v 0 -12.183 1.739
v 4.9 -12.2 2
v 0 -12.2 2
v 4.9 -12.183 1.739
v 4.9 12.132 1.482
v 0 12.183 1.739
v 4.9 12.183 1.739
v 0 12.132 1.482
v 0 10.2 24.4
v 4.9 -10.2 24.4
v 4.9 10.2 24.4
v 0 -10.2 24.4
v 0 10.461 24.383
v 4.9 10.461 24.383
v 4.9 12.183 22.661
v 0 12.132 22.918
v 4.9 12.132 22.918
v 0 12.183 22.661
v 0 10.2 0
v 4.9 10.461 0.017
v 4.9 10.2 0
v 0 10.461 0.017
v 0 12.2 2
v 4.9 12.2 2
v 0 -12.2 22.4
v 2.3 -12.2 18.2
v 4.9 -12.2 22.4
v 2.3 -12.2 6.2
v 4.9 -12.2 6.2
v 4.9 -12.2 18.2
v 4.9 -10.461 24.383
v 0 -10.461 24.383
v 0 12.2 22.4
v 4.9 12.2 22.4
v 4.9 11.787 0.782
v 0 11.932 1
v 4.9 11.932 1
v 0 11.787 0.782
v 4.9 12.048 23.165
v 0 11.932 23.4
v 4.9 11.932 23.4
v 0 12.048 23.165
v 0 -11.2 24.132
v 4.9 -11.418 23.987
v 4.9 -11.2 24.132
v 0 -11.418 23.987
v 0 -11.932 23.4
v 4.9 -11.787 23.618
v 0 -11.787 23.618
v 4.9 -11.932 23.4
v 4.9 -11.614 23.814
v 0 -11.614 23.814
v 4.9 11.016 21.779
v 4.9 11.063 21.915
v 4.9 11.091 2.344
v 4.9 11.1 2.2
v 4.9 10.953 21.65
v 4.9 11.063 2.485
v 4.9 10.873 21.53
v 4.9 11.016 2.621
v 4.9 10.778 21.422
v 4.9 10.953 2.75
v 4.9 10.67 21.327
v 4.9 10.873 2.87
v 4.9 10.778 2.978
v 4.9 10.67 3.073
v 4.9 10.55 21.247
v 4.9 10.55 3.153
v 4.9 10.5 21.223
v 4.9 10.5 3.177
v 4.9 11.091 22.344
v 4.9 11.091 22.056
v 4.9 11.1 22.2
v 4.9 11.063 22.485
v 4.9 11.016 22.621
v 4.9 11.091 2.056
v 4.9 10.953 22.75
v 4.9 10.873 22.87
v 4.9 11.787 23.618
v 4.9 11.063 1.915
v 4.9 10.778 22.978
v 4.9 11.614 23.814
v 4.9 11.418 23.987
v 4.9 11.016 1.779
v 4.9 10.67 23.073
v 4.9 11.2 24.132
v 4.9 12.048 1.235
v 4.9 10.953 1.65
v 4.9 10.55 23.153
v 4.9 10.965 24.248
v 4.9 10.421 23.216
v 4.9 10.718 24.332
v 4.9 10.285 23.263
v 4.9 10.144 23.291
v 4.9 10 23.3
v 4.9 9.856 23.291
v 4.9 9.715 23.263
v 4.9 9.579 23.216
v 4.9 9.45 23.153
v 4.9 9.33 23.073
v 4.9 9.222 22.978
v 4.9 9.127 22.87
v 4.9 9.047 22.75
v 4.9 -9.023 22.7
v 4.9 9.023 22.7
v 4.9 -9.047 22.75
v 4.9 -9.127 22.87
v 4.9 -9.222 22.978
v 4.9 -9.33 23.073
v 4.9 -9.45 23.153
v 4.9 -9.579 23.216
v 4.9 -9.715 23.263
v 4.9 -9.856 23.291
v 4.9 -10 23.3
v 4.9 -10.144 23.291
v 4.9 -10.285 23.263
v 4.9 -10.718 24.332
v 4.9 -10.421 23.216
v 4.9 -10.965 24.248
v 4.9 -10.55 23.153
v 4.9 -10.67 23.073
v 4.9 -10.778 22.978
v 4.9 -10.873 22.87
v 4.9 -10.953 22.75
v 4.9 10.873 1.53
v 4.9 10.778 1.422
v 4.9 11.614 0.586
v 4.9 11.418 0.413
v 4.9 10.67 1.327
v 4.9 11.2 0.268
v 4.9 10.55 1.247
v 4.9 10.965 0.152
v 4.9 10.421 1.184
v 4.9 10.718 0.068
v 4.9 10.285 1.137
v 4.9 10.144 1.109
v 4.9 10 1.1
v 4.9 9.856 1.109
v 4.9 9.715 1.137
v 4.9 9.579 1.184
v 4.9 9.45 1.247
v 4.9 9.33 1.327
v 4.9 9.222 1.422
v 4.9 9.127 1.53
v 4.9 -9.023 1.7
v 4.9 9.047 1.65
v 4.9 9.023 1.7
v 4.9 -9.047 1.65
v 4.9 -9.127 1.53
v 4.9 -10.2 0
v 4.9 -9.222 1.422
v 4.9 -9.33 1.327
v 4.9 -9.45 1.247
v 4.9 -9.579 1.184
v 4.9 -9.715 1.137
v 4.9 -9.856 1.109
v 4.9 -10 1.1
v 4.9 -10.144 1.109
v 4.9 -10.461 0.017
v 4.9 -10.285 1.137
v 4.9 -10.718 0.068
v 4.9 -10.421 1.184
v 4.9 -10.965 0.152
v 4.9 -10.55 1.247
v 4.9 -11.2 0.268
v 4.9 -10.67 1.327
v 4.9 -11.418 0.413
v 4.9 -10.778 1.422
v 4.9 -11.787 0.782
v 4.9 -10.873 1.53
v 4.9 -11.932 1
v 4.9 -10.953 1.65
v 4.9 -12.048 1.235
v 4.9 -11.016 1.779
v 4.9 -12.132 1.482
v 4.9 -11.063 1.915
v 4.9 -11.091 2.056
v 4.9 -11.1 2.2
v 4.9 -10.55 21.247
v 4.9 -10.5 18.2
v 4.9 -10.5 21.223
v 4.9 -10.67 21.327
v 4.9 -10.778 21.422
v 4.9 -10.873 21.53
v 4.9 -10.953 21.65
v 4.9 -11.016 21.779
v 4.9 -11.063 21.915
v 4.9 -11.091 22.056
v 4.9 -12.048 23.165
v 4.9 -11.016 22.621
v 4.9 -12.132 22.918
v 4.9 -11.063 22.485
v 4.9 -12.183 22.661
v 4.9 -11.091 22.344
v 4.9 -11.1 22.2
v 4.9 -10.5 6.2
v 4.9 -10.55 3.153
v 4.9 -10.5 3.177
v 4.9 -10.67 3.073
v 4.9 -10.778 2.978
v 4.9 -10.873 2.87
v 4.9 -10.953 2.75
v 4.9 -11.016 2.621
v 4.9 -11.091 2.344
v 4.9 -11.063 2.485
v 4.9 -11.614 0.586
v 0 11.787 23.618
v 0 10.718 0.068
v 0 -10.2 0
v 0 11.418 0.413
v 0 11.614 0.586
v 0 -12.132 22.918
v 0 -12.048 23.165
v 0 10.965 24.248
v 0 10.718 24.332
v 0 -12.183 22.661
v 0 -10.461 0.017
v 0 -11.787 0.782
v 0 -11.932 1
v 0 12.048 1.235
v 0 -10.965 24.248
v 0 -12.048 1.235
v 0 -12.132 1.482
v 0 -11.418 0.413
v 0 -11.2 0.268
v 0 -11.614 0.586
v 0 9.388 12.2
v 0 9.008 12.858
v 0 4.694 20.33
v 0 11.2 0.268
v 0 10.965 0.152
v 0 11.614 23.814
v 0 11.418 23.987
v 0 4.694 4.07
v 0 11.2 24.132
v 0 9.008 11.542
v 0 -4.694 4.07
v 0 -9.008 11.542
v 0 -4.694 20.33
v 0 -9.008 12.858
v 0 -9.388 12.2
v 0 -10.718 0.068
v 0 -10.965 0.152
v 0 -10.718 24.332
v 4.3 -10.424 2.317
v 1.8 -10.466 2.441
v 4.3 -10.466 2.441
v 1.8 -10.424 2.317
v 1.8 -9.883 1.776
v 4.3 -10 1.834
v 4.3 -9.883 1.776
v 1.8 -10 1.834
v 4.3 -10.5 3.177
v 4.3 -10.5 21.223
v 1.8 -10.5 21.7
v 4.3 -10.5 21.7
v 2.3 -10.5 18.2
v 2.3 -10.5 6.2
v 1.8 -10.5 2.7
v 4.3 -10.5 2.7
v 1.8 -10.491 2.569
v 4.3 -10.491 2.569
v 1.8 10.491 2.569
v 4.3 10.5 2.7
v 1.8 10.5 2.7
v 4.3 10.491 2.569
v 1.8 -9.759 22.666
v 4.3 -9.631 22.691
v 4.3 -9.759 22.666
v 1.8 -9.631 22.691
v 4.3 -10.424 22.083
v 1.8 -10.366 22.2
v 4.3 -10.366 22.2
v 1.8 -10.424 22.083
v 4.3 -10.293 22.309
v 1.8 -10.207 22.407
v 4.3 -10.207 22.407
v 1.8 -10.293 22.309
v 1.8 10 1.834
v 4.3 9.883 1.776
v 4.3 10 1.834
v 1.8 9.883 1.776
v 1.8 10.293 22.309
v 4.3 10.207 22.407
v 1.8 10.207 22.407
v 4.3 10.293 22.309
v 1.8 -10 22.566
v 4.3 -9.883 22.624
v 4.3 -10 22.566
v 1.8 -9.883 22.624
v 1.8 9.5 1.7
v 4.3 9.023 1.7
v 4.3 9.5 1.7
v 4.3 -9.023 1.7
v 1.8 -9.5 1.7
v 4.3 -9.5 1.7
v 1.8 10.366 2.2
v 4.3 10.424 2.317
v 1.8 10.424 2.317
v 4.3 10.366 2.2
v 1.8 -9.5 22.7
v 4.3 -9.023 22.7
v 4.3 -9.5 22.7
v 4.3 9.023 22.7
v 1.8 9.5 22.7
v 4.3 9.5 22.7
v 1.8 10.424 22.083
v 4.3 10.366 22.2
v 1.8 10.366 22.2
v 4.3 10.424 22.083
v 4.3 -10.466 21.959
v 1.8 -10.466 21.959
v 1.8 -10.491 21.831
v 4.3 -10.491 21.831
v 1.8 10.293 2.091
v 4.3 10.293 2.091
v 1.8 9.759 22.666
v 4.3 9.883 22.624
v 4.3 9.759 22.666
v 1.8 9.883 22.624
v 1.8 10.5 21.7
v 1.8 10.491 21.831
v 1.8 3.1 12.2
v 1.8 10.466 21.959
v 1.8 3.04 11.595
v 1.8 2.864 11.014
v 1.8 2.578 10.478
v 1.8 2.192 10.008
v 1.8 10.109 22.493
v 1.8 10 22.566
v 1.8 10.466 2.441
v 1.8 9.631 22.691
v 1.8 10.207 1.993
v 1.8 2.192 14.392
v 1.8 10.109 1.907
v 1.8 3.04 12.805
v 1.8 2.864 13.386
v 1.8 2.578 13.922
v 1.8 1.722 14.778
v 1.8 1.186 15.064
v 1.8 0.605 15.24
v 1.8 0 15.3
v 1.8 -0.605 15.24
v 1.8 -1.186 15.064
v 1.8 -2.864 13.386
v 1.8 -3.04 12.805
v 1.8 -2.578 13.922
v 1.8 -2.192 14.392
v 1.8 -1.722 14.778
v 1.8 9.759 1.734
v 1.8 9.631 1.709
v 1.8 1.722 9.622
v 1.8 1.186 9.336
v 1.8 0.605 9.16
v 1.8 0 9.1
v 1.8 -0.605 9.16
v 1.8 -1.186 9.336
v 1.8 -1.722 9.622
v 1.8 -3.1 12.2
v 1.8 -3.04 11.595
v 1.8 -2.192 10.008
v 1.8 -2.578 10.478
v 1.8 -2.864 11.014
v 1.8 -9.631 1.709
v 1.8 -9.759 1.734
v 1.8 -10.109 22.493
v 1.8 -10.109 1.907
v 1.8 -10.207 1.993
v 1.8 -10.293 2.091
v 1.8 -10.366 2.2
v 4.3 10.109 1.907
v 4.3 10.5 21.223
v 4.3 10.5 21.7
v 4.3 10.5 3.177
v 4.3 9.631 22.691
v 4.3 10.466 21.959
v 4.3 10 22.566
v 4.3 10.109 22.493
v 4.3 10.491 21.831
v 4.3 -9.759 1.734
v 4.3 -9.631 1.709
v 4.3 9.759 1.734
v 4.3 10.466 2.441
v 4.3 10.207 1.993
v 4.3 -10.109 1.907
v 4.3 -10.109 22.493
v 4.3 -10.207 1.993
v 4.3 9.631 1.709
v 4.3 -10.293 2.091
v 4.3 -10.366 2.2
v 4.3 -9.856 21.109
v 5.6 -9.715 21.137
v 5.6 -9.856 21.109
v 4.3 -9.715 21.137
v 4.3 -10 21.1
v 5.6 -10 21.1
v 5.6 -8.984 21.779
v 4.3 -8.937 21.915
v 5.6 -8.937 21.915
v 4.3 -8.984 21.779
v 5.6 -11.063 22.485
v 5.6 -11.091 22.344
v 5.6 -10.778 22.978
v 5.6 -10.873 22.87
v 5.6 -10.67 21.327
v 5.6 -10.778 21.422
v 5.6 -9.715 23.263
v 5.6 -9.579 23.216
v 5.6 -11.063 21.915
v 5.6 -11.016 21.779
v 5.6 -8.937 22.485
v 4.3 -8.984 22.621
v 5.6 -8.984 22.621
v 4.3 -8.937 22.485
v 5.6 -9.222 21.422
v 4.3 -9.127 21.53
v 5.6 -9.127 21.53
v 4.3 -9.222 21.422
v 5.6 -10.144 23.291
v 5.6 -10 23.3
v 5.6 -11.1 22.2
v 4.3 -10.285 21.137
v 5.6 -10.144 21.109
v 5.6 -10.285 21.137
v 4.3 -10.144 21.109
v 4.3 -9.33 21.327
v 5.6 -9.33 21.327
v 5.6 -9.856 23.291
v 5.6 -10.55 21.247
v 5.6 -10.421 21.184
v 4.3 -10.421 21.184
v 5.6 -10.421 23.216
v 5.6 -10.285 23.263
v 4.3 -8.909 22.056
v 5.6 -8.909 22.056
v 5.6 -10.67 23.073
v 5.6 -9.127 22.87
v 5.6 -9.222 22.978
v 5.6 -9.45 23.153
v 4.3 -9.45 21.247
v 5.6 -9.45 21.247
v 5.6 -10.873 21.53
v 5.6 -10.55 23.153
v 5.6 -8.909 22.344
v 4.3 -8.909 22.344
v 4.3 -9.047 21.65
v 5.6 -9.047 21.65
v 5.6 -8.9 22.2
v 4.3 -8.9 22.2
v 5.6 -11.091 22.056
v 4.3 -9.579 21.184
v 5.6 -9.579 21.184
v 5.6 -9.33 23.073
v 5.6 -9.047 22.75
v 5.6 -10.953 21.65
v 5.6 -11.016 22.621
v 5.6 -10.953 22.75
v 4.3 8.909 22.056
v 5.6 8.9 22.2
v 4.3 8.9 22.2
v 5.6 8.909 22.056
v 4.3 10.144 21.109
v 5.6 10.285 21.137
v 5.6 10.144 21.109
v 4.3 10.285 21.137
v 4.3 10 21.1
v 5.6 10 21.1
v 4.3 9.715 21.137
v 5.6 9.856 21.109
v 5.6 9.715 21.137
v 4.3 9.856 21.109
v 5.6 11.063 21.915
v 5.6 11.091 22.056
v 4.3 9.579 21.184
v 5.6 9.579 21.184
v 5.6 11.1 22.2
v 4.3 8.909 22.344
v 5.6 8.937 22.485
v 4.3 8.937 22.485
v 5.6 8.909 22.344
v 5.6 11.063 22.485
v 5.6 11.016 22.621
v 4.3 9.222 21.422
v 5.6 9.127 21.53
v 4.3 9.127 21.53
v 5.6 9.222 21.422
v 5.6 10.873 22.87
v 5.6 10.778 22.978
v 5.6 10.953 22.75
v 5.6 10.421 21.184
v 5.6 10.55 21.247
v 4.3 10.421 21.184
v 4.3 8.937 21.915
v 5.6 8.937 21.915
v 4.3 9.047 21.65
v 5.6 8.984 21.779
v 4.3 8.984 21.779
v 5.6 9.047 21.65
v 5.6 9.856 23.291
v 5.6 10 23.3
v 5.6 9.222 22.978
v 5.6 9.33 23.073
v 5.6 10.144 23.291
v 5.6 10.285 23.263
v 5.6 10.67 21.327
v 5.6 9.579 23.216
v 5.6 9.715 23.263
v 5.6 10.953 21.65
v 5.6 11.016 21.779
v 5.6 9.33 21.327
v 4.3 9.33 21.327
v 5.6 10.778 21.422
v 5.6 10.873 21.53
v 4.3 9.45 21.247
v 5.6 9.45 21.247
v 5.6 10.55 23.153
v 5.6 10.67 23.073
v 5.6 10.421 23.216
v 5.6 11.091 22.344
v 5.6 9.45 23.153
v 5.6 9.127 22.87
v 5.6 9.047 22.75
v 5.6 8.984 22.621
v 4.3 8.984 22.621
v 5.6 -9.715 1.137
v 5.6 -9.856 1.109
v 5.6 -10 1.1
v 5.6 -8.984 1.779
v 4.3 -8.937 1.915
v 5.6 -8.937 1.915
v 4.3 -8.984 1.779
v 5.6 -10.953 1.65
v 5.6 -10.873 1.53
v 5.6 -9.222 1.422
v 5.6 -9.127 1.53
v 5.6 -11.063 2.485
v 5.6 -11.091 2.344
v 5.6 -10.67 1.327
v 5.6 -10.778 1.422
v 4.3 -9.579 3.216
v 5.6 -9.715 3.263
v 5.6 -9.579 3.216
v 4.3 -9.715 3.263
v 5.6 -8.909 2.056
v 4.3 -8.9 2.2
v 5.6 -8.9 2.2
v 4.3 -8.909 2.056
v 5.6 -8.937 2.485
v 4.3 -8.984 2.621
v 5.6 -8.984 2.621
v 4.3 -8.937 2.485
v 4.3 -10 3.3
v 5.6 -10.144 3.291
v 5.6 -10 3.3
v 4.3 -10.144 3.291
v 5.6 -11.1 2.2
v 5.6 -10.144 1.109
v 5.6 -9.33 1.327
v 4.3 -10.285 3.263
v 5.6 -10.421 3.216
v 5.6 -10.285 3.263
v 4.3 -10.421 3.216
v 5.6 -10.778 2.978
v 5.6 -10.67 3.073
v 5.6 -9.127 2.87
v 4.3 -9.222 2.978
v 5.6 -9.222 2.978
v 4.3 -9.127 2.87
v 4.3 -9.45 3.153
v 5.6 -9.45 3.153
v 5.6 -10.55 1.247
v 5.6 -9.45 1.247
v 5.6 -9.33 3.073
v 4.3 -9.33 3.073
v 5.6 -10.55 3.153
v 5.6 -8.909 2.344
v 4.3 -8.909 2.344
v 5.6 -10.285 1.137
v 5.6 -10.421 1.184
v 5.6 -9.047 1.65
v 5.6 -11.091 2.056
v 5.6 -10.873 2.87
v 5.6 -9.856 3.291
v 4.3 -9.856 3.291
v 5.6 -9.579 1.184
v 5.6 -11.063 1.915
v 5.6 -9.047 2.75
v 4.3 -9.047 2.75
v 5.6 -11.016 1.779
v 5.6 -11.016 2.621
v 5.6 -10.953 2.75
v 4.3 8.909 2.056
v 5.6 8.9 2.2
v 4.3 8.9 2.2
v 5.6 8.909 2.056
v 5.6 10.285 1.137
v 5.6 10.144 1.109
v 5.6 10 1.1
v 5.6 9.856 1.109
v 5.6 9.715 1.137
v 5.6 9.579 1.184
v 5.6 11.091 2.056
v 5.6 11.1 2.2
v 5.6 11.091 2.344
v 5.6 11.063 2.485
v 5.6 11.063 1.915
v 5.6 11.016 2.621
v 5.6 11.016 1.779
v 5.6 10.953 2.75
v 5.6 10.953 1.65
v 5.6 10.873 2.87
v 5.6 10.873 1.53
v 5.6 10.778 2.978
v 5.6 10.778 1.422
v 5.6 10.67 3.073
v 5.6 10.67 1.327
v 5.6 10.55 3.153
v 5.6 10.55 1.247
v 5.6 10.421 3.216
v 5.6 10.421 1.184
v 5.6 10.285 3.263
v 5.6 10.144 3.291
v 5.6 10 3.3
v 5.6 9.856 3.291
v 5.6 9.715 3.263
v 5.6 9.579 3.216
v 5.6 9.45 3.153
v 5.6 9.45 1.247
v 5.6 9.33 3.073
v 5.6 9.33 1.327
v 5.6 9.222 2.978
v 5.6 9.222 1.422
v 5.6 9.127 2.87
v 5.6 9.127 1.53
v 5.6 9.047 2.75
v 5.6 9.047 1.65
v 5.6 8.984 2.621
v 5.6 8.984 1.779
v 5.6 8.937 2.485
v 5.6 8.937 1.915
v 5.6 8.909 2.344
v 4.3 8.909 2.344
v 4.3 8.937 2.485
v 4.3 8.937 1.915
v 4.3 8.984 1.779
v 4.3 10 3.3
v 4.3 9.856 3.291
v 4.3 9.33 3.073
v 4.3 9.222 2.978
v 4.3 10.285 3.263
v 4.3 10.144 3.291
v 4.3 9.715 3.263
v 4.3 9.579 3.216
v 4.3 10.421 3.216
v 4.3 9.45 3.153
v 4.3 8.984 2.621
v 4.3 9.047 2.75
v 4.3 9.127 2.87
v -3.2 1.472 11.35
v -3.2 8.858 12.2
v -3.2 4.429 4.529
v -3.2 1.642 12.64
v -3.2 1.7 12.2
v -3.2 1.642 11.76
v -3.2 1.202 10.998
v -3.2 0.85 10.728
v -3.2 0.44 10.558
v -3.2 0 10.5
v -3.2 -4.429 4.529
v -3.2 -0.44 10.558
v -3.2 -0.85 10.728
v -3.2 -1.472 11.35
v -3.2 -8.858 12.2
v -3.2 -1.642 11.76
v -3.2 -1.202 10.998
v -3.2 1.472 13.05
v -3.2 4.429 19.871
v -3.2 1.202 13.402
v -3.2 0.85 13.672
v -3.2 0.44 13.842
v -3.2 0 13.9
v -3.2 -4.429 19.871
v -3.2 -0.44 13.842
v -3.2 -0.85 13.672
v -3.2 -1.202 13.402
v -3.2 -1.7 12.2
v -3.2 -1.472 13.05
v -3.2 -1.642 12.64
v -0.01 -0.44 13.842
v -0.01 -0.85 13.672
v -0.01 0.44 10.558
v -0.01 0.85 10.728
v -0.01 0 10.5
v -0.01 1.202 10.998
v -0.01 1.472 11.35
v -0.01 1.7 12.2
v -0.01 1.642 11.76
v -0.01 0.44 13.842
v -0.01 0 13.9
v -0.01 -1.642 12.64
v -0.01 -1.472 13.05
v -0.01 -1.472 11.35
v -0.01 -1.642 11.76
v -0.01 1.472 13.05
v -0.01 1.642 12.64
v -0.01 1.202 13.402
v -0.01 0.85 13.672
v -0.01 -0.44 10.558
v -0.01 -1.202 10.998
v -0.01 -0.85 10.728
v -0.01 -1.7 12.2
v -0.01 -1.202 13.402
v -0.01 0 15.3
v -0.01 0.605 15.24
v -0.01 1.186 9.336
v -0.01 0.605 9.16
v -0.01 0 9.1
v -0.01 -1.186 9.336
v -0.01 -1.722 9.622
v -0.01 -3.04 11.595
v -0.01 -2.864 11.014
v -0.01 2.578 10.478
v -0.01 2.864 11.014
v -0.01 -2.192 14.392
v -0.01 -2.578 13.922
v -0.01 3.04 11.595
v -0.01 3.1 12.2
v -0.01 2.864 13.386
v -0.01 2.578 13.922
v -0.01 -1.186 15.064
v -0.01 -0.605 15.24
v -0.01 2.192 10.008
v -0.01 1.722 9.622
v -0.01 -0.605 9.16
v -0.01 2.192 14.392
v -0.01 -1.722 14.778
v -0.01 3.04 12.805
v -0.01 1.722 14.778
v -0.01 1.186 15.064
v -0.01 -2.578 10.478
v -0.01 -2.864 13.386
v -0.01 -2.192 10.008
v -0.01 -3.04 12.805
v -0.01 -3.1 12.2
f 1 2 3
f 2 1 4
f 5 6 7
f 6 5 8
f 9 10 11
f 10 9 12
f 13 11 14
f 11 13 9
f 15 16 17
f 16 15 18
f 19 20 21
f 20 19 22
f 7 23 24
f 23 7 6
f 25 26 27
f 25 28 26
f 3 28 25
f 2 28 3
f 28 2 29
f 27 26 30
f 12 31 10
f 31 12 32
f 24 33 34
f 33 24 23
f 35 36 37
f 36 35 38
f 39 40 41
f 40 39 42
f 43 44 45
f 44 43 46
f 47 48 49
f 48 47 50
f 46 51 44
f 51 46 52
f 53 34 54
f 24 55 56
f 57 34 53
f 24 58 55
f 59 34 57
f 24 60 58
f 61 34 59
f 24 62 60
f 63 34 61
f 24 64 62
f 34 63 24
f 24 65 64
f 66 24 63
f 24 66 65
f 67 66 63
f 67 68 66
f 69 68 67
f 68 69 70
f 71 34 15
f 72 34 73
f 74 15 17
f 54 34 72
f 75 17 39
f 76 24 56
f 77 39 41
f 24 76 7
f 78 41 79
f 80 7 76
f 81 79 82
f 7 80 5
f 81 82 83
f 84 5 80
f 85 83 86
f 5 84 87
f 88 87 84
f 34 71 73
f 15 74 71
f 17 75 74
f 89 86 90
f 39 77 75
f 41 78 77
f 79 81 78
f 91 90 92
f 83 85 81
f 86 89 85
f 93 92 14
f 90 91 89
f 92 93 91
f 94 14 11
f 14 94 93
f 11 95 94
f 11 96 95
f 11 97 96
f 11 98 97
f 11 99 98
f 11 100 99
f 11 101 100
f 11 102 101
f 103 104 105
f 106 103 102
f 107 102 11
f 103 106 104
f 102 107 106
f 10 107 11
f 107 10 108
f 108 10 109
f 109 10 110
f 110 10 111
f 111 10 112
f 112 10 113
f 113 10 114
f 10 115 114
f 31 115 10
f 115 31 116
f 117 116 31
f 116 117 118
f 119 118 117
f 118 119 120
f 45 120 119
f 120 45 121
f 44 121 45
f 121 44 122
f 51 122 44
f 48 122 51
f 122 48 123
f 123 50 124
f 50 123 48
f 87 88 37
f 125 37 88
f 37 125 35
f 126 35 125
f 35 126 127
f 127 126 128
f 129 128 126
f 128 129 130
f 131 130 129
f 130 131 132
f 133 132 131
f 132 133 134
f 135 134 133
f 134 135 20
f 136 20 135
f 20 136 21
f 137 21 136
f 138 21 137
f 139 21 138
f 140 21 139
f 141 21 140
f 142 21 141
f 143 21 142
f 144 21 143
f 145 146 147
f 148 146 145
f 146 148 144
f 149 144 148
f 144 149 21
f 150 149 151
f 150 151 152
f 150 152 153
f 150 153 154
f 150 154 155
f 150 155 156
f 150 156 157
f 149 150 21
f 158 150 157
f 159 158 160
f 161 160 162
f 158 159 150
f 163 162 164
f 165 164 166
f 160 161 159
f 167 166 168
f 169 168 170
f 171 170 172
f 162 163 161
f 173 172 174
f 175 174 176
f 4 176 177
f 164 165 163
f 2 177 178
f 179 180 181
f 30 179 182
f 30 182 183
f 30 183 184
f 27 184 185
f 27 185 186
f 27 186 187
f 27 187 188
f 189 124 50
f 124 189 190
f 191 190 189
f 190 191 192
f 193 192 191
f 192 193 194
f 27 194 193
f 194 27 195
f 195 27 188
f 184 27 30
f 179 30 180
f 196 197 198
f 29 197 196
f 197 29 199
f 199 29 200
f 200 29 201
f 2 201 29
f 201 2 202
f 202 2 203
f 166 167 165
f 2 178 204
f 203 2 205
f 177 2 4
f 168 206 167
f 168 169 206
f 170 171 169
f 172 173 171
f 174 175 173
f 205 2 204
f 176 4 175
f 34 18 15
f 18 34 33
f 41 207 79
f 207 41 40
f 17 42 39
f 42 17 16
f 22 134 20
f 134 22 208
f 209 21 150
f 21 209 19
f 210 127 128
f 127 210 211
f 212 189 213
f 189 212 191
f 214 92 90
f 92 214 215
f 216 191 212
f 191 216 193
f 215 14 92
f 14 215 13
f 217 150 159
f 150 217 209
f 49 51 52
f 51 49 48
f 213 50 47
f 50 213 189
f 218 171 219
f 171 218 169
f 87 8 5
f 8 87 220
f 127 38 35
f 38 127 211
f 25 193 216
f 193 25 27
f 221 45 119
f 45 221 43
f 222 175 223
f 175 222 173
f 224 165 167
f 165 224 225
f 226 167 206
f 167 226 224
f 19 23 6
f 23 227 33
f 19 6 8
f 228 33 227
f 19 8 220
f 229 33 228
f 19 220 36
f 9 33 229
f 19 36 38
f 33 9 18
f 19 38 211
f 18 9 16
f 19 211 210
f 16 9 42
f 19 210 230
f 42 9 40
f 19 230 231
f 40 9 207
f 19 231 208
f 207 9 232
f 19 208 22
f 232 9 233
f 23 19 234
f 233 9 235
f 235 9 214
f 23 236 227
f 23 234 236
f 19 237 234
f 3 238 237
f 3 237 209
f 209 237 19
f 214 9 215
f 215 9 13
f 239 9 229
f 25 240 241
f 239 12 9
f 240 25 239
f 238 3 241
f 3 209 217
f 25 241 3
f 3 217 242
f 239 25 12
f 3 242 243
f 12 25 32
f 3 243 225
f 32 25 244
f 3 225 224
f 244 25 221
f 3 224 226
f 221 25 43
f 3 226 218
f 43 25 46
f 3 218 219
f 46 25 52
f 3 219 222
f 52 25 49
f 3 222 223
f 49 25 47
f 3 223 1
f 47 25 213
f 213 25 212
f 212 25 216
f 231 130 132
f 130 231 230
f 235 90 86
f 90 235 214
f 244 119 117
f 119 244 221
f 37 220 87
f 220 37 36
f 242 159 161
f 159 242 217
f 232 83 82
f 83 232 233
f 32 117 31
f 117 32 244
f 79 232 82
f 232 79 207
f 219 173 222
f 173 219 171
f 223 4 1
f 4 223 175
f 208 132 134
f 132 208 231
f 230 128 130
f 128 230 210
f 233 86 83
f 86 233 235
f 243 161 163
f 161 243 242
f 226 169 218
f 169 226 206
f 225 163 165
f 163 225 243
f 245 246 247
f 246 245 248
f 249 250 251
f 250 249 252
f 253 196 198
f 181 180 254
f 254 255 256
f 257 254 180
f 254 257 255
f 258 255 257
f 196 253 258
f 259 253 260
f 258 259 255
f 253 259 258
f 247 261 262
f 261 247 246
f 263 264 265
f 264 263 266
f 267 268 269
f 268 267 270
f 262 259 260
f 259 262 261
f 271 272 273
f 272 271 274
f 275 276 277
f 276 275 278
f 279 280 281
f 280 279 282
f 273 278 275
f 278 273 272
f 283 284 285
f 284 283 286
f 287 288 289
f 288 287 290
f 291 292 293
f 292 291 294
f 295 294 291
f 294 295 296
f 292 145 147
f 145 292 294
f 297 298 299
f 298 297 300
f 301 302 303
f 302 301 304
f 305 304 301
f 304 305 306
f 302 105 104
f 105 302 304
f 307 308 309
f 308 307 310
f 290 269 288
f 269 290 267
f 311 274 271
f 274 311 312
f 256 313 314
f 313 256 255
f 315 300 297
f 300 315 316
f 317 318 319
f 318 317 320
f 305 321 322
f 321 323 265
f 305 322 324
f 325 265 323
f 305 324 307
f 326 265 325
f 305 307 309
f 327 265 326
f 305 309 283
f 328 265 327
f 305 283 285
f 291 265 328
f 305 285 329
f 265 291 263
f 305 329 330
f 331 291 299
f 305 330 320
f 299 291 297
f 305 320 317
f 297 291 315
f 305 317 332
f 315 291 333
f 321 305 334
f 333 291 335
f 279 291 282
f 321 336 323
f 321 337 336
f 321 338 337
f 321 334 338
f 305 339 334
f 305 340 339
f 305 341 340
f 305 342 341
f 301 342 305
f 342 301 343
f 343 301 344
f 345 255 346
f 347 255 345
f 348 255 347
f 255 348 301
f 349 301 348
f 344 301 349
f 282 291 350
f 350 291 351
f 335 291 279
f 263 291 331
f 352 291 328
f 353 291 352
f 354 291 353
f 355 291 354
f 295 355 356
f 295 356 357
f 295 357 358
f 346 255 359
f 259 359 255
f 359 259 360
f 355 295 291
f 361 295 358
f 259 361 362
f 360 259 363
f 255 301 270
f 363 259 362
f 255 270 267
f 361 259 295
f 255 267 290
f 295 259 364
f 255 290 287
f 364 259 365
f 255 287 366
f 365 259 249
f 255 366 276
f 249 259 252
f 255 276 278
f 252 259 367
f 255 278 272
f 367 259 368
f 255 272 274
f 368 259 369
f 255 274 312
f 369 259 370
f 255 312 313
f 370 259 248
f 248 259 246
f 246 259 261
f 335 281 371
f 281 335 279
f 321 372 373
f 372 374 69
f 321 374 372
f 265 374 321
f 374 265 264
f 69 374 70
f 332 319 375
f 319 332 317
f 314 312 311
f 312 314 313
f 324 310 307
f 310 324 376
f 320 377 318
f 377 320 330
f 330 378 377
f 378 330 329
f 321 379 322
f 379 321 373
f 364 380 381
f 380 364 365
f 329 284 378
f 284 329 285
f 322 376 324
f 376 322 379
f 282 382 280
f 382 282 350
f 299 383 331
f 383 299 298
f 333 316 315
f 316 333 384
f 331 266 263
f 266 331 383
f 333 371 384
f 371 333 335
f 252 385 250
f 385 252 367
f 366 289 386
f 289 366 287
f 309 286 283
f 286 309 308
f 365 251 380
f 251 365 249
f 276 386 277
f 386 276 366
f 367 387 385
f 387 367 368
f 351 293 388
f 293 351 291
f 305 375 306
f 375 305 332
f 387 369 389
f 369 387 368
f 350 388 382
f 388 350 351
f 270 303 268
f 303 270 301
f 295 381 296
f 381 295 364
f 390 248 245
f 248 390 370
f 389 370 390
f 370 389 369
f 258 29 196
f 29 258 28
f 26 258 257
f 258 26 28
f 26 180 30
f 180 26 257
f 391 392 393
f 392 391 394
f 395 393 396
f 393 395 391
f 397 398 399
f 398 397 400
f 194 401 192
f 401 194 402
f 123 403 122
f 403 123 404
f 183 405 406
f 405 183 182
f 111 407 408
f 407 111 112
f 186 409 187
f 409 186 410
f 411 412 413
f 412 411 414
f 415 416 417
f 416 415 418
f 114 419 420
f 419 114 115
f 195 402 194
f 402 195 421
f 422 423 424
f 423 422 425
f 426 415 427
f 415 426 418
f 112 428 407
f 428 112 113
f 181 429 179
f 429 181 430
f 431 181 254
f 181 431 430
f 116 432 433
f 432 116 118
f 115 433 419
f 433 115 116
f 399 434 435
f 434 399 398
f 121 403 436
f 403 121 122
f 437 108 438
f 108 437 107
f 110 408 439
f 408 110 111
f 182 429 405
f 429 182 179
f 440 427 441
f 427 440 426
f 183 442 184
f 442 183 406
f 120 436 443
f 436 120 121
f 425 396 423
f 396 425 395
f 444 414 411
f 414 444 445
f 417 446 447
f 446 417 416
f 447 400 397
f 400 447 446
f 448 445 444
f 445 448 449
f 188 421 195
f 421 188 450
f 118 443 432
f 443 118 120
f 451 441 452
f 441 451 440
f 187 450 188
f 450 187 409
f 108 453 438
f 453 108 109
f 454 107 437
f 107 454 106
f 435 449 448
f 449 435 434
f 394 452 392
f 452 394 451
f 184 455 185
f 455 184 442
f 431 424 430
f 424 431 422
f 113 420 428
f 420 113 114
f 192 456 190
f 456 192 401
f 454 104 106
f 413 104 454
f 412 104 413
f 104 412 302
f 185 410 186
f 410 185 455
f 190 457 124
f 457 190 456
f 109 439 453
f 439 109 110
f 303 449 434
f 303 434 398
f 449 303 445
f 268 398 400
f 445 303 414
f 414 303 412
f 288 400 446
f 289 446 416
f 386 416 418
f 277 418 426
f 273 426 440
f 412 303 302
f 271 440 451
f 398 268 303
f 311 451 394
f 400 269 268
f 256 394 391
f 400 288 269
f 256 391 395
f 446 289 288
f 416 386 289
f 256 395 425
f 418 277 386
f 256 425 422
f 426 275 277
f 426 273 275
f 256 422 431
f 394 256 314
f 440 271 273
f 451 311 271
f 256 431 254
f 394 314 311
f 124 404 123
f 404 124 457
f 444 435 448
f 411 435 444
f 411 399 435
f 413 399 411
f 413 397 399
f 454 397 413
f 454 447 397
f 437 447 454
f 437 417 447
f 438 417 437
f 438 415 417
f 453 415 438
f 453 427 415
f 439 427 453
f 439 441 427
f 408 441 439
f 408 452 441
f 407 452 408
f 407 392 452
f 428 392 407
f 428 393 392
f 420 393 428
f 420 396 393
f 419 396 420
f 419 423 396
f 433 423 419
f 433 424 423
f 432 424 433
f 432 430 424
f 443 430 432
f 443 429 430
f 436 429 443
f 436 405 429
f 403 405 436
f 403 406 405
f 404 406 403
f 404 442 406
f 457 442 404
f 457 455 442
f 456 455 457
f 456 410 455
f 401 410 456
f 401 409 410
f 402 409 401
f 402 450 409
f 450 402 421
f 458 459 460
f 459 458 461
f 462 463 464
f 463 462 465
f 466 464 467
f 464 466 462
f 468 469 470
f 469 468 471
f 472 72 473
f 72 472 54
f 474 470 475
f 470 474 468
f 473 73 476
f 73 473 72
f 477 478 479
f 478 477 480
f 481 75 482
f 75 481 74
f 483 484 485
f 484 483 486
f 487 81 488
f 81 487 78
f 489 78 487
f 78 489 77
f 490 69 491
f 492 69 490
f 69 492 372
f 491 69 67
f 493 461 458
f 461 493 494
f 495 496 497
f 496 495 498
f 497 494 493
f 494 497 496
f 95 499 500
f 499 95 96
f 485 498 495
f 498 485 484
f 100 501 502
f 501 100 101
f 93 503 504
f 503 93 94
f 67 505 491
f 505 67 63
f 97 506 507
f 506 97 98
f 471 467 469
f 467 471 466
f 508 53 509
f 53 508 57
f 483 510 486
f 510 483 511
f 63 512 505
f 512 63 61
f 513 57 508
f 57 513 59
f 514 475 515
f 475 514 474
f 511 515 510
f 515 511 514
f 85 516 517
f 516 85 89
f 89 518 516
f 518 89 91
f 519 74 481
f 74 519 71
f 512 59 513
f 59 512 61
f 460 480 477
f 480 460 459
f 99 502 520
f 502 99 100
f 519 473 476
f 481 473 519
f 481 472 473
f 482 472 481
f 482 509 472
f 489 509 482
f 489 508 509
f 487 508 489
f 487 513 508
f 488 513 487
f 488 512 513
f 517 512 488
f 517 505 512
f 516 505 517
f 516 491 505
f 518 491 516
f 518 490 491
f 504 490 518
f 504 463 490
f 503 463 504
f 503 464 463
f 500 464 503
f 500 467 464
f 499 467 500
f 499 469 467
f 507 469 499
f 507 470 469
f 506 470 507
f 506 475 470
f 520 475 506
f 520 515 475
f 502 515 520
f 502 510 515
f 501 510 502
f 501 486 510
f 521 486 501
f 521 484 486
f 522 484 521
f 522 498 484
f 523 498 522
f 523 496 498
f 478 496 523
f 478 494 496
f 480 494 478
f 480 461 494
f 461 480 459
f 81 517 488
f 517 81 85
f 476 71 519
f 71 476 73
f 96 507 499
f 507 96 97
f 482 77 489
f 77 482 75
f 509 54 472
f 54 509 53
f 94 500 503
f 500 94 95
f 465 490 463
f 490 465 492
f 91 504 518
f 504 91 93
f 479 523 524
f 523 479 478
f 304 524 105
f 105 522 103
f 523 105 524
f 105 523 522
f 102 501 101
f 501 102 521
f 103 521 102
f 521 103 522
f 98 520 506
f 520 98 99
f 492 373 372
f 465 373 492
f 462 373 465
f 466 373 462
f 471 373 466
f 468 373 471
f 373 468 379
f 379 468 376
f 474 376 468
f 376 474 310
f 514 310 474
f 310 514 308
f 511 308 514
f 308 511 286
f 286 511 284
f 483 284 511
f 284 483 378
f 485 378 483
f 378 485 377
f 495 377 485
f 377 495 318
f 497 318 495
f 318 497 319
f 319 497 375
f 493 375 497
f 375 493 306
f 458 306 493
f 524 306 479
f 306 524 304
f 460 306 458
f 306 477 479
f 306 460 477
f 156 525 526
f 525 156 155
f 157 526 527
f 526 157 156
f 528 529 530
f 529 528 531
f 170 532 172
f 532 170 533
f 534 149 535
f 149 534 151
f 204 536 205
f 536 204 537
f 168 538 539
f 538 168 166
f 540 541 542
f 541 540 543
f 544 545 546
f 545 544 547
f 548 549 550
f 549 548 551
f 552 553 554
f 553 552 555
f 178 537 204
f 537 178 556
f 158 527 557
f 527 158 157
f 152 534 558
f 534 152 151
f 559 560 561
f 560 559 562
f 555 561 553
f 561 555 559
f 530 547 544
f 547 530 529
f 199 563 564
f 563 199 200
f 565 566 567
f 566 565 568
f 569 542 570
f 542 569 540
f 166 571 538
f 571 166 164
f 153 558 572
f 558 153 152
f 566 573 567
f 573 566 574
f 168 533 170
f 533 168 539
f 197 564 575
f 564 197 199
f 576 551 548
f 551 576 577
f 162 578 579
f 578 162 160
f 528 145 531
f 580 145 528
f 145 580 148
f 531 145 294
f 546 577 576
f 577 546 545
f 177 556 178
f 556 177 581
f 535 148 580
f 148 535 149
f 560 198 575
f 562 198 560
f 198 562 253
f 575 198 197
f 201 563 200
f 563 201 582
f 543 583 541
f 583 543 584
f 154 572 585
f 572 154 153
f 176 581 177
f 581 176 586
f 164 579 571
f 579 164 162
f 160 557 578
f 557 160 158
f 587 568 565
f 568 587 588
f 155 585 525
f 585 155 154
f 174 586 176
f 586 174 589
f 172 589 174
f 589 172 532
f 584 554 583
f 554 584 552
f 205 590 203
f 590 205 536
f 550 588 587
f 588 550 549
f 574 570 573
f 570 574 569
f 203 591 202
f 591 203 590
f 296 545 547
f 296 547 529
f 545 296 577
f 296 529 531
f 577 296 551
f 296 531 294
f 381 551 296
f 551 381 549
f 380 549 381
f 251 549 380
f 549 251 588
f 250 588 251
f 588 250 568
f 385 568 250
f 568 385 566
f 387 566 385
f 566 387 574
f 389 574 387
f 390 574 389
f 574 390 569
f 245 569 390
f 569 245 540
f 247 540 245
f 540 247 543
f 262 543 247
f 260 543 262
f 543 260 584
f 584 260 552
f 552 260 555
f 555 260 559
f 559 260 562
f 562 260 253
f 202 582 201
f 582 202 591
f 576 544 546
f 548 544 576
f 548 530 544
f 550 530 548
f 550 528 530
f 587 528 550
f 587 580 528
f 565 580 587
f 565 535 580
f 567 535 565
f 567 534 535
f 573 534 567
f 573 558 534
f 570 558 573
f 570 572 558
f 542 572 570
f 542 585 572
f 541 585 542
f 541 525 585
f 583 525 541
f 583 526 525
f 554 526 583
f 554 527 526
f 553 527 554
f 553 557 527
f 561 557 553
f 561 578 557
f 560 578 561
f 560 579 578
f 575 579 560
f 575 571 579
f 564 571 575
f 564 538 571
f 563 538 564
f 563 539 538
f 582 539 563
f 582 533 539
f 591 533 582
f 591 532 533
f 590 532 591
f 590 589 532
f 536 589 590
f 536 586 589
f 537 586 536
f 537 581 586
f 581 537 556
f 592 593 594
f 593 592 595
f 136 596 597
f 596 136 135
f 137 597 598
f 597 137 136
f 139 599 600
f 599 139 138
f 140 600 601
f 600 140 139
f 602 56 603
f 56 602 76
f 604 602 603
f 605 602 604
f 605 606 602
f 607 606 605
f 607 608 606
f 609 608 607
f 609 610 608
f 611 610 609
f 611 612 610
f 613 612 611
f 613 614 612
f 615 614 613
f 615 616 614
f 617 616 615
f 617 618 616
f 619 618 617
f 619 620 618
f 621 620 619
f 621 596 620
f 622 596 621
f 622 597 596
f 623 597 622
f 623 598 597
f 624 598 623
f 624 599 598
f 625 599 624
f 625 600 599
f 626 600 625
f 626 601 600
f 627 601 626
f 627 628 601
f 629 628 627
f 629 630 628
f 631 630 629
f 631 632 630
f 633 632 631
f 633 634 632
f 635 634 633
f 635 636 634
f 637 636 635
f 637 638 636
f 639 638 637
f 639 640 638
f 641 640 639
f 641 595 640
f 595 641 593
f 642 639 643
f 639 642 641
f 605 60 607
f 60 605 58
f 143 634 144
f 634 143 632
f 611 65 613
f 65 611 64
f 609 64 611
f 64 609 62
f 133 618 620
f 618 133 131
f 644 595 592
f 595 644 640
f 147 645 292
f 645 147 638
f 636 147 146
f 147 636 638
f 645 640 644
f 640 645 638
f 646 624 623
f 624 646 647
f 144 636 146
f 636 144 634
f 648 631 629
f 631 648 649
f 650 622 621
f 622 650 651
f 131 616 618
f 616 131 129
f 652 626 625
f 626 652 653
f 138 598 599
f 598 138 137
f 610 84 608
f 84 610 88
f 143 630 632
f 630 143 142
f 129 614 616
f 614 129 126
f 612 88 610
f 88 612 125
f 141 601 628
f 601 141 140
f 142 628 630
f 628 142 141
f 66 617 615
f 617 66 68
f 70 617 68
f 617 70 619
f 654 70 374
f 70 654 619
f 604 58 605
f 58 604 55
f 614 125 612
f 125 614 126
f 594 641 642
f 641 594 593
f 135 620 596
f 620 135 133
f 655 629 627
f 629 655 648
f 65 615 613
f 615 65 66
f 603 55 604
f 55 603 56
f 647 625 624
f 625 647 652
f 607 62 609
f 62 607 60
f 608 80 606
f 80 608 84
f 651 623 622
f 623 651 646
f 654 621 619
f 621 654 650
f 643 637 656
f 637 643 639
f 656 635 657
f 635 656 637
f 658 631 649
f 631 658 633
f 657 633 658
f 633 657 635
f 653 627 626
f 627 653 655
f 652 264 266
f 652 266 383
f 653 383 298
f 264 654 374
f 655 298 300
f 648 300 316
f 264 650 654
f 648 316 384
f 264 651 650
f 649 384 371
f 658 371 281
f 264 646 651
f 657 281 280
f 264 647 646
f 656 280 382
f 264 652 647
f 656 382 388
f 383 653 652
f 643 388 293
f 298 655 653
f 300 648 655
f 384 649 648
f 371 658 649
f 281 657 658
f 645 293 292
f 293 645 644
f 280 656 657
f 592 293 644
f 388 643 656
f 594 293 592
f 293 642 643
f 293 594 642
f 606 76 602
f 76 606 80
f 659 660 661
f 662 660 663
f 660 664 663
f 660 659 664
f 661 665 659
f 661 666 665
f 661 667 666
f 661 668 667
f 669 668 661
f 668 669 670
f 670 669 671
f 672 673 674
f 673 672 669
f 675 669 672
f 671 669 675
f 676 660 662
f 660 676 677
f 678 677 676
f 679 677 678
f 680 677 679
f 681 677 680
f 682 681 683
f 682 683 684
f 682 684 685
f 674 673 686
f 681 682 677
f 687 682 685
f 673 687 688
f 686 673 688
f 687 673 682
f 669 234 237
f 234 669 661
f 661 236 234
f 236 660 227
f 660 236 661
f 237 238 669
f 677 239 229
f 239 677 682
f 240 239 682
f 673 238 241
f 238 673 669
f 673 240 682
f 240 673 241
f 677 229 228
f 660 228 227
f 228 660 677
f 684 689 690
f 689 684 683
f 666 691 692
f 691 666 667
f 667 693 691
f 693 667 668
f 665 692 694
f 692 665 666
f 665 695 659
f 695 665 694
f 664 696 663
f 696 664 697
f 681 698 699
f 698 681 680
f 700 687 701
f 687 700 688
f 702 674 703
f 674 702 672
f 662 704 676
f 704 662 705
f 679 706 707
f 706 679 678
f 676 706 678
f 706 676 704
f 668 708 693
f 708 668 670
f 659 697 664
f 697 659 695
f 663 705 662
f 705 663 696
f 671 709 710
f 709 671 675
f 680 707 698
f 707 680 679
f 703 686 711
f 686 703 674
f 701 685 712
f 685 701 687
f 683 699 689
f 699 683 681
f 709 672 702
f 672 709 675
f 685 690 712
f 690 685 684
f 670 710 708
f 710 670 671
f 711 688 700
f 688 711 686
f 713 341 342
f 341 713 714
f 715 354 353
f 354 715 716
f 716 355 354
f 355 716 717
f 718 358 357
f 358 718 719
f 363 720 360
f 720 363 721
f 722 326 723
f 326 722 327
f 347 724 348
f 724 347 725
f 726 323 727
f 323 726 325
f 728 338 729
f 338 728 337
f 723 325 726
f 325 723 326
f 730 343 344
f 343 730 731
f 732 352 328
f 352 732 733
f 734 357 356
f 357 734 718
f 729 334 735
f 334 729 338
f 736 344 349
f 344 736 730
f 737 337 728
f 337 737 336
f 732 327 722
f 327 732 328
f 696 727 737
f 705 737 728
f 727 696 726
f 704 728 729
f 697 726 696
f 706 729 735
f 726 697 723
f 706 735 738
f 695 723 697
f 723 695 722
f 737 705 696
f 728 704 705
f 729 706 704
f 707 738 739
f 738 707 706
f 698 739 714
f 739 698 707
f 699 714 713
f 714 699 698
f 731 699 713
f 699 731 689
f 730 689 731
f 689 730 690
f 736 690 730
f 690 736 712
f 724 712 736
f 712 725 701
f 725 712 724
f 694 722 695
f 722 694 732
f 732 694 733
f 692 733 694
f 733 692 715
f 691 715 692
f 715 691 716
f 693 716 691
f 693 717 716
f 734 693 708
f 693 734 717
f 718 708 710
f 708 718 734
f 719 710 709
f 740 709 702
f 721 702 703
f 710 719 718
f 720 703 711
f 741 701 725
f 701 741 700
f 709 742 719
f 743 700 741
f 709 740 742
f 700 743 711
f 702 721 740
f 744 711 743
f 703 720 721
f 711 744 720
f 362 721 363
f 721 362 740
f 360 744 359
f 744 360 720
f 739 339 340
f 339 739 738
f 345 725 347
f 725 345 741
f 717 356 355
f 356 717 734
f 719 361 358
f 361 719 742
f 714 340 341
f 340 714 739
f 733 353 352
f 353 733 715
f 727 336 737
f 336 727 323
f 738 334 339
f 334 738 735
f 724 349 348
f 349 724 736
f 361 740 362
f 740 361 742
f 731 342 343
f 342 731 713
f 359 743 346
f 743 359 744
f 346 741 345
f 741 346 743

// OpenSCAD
// file: rm_common.scad
// RobotMind V1 mechanical standard. All dimensions are millimetres.
$fn = 48;

RM_UNIT = 40;
RM_PLATE_T = 12;
RM_FIT = 0; // positive is looser; tune in 0.05 mm steps

// One carrier joint: a progressive hex press fit plus an optional M3 lock.
RM_SOCKET_DEPTH = 3.4;
RM_HEX_AF = 16;
RM_HEX_R = RM_HEX_AF/sqrt(3);
RM_HEX_TAPER = 0.28;
RM_HEX_ENTRY_CLEARANCE = 0.10+RM_FIT;
RM_HEX_GRIP = 0.20-RM_FIT;
RM_HEX_PITCH = 20;
RM_HEX_X = RM_HEX_PITCH;
RM_HEX_Y = sqrt(3)/2*RM_HEX_PITCH;

// Plate-to-plate 90° box joint: integral tabs enter open edge slots.
RM_JOIN_PITCH = 10;
RM_JOIN_LENGTH = 3.0;
RM_JOIN_W = 6;
RM_JOIN_CLEARANCE = 0.06+RM_FIT;
RM_M3_CLEARANCE = 3.4;
RM_M3_PILOT = 2.6;
RM_M3_HEAD = 6.2;
RM_M3_INSERT_HOLE = 4.0; // tune for the chosen M3 heat-set insert
RM_M3_INSERT_LENGTH = 5.0;
RM_M3_MEMBRANE = 0.3;
RM_M3_BLIND_DEPTH =
  (RM_PLATE_T-2*RM_SOCKET_DEPTH-RM_M3_MEMBRANE)/2;

assert(RM_PLATE_T > 2 * RM_SOCKET_DEPTH,
       "Plate needs a solid web between its two carrier sockets");
assert(RM_HEX_ENTRY_CLEARANCE >= 0 && RM_HEX_GRIP > 0 &&
       RM_JOIN_CLEARANCE >= 0,
       "RM_FIT is outside the printable range");
assert(RM_M3_BLIND_DEPTH > 0,
       "Plate is too thin for double-sided M3 insert pockets");
assert(2*RM_M3_BLIND_DEPTH+RM_M3_MEMBRANE >= RM_M3_INSERT_LENGTH,
       "Plate web is too thin for the M3 insert");

module rounded_box(size=[20,20,3], r=2, center=false) {
  x=size[0]; y=size[1]; z=size[2];
  translate(center ? [-x/2,-y/2,-z/2] : [0,0,0])
    linear_extrude(height=z)
      offset(r=r) offset(delta=-r) square([x,y]);
}

module print_on_x_edge(span) {
  translate([0,0,span/2]) rotate([0,90,0]) children();
}

module print_on_y_edge(span) {
  translate([0,0,span/2]) rotate([90,0,0]) children();
}

module hex_frustum(r1=RM_HEX_R, r2=RM_HEX_R, h=1) {
  rotate([0,0,30]) cylinder(r1=r1,r2=r2,h=h,$fn=6);
}

module top_socket_cut() {
  union() {
    translate([0,0,RM_PLATE_T-RM_SOCKET_DEPTH])
      hex_frustum(RM_HEX_R-RM_HEX_TAPER,
                   RM_HEX_R,
                   RM_SOCKET_DEPTH+0.1);
    translate([0,0,RM_PLATE_T-RM_SOCKET_DEPTH-RM_M3_BLIND_DEPTH])
      cylinder(h=RM_M3_BLIND_DEPTH+0.1,d=RM_M3_INSERT_HOLE,$fn=24);
  }
}

module bottom_socket_cut() {
  union() {
    translate([0,0,-0.1])
      hex_frustum(RM_HEX_R,
                   RM_HEX_R-RM_HEX_TAPER,
                   RM_SOCKET_DEPTH+0.1);
    translate([0,0,RM_SOCKET_DEPTH-0.1])
      cylinder(h=RM_M3_BLIND_DEPTH+0.1,d=RM_M3_INSERT_HOLE,$fn=24);
  }
}

module socket_pair() {
  top_socket_cut();
  bottom_socket_cut();
}

// Triangular lattice. Female edges reserve enough material for corner slots;
// the 5.5 mm origin shift keeps the 20 mm pitch and centers the usable area.
module dense_socket_grid(size=[2*RM_UNIT,2*RM_UNIT]) {
  rows=ceil(size[1]/RM_HEX_Y)+2;
  cols=ceil(size[0]/RM_HEX_X)+2;
  female_margin=RM_PLATE_T+1;
  male_margin=2;
  origin=(female_margin-male_margin)/2;
  for(row=[-rows:rows], col=[-cols:cols]) {
    y=origin+row*RM_HEX_Y;
    x=origin+(col + ((abs(row)%2)==1 ? 0.5 : 0))*RM_HEX_X;
    if(x-RM_HEX_AF/2 >= -size[0]/2+female_margin &&
       x+RM_HEX_AF/2 <= size[0]/2-male_margin &&
       y-RM_HEX_R >= -size[1]/2+female_margin &&
       y+RM_HEX_R <= size[1]/2-male_margin)
      translate([x,y,0]) socket_pair();
  }
}

function join_index(p,edge_len) =
  round((p+edge_len/2-RM_JOIN_PITCH/2)/RM_JOIN_PITCH);
function is_m3_join(p,edge_len) = join_index(p,edge_len)%4 == 1;

// Integral rectangular tabs on an A edge (+Y in local coordinates).
module male_edge(edge_len, plate_half) {
  for(p=[-edge_len/2+RM_JOIN_PITCH/2:
         RM_JOIN_PITCH:
         edge_len/2-RM_JOIN_PITCH/2])
    translate([p-RM_JOIN_W/2,plate_half-0.05,0])
      cube([RM_JOIN_W,RM_JOIN_LENGTH+0.05,RM_PLATE_T]);
}

// Blind thread-forming pilots continue through selected tabs into the edge.
module male_edge_m3_cuts(edge_len, plate_half) {
  for(p=[-edge_len/2+RM_JOIN_PITCH/2:
         RM_JOIN_PITCH:
         edge_len/2-RM_JOIN_PITCH/2])
    if(is_m3_join(p,edge_len))
      translate([p,plate_half-4,RM_PLATE_T/2])
        rotate([-90,0,0])
          cylinder(h=RM_JOIN_LENGTH+4.2,d=RM_M3_PILOT,$fn=24);
}

// Female B edge (-Y): open slots accept tabs from either face at 90°.
module female_edge_cuts(edge_len, plate_half) {
  for(p=[-edge_len/2+RM_JOIN_PITCH/2:
         RM_JOIN_PITCH:
         edge_len/2-RM_JOIN_PITCH/2]) {
    translate([p-RM_JOIN_W/2-RM_JOIN_CLEARANCE,
               -plate_half-0.1,-0.1])
      cube([RM_JOIN_W+2*RM_JOIN_CLEARANCE,
            RM_PLATE_T+RM_JOIN_CLEARANCE,
            RM_JOIN_LENGTH+0.1]);
    translate([p-RM_JOIN_W/2-RM_JOIN_CLEARANCE,
               -plate_half-0.1,RM_PLATE_T-RM_JOIN_LENGTH])
      cube([RM_JOIN_W+2*RM_JOIN_CLEARANCE,
            RM_PLATE_T+RM_JOIN_CLEARANCE,
            RM_JOIN_LENGTH+0.1]);
    if(is_m3_join(p,edge_len)) {
      translate([p,-plate_half+RM_PLATE_T/2,-0.1])
        cylinder(h=RM_PLATE_T+0.2,d=RM_M3_CLEARANCE,$fn=24);
    }
  }
}

// Identical plates: tabs on +X/+Y and 90° slots on -X/-Y.
module plate(size=[2*RM_UNIT,2*RM_UNIT]) {
  assert(size[0] % RM_UNIT == 0 && size[1] % RM_UNIT == 0,
         "Plate dimensions must be whole 40 mm units");
  difference() {
    union() {
      translate([-size[0]/2,-size[1]/2,0])
        rounded_box([size[0],size[1],RM_PLATE_T],1.5);
      male_edge(size[0],size[1]/2);
      rotate([0,0,-90]) male_edge(size[1],size[0]/2);
    }
    dense_socket_grid(size);
    female_edge_cuts(size[0],size[1]/2);
    rotate([0,0,-90]) female_edge_cuts(size[1],size[0]/2);
    male_edge_m3_cuts(size[0],size[1]/2);
    rotate([0,0,-90]) male_edge_m3_cuts(size[1],size[0]/2);
  }
}

// The tip enters freely; the last fraction of travel supplies the grip.
module integral_hex_plug() {
  translate([0,0,-RM_SOCKET_DEPTH+0.2])
    hex_frustum(RM_HEX_R-RM_HEX_TAPER-RM_HEX_ENTRY_CLEARANCE,
                 RM_HEX_R+RM_HEX_GRIP,
                 RM_SOCKET_DEPTH+0.1);
}

// Adds the universal plug. M3 is optional: the press fit works alone.
module carrier_mount() {
  difference() {
    union() {
      children();
      integral_hex_plug();
    }
    translate([0,0,-RM_SOCKET_DEPTH])
      cylinder(h=RM_SOCKET_DEPTH+100,d=RM_M3_CLEARANCE,$fn=24);
    translate([0,0,-0.01])
      cylinder(h=2.21,d=RM_M3_HEAD,$fn=32);
  }
}

module sensor_carrier(pcb=[20,20], wall=1.7, floor=1.8, clearance=0.5) {
  W=pcb[0]+2*(wall+clearance);
  L=pcb[1]+2*(wall+clearance);
  assert(W >= 2*(RM_HEX_R+RM_HEX_GRIP),
         "Carrier is narrower than its integral hex plug");
  carrier_mount() union() {
    translate([-W/2,-L/2,0]) difference() {
      rounded_box([W,L,floor+3.1],2);
      translate([wall,wall,floor])
        rounded_box([pcb[0]+2*clearance,pcb[1]+2*clearance,5],1);
      translate([W/2-6,-0.2,floor+0.5]) cube([12,wall+1,3.5]);
    }
    for(x=[-W/2+2.2,W/2-2.2], y=[-L/2+2.2,L/2-2.2])
      translate([x,y,floor+2.5]) cylinder(h=1.3,d=2.2);
  }
}

module tag_insert(tag=[60,60], border=3, t=1) {
  W=tag[0]+2*border; H=tag[1]+2*border;
  union() {
    translate([-W/2,-H/2,0]) rounded_box([W,H,t],1.2);
    translate([-8,-H/2-4,0]) rounded_box([16,5,t],1.2);
  }
}

module tag_insert_rails(tag=[60,60], border=4, rail=1.5,
                        depth=2.2, clearance=0.25, lip=0.8, lip_t=0.6) {
  W=tag[0]+2*border; H=tag[1]+2*border;
  for(sx=[-1,1]) {
    x=sx>0 ? W/2+clearance : -W/2-clearance-rail;
    translate([x,-H/2-clearance,0])
      cube([rail,H+2*clearance+rail,depth]);
    translate([sx>0 ? W/2-lip : -W/2-clearance-rail,
               -H/2-clearance,depth-lip_t])
      cube([rail+clearance+lip,H+2*clearance+rail,lip_t]);
  }
  translate([-W/2-clearance-rail,H/2+clearance,0])
    cube([W+2*(clearance+rail),rail,depth]);
}
// main file
include <rm_common.scad>

PCB=[20,20];
W=PCB[0]+2*(1.7+0.5);
print_on_x_edge(W) sensor_carrier(PCB);
